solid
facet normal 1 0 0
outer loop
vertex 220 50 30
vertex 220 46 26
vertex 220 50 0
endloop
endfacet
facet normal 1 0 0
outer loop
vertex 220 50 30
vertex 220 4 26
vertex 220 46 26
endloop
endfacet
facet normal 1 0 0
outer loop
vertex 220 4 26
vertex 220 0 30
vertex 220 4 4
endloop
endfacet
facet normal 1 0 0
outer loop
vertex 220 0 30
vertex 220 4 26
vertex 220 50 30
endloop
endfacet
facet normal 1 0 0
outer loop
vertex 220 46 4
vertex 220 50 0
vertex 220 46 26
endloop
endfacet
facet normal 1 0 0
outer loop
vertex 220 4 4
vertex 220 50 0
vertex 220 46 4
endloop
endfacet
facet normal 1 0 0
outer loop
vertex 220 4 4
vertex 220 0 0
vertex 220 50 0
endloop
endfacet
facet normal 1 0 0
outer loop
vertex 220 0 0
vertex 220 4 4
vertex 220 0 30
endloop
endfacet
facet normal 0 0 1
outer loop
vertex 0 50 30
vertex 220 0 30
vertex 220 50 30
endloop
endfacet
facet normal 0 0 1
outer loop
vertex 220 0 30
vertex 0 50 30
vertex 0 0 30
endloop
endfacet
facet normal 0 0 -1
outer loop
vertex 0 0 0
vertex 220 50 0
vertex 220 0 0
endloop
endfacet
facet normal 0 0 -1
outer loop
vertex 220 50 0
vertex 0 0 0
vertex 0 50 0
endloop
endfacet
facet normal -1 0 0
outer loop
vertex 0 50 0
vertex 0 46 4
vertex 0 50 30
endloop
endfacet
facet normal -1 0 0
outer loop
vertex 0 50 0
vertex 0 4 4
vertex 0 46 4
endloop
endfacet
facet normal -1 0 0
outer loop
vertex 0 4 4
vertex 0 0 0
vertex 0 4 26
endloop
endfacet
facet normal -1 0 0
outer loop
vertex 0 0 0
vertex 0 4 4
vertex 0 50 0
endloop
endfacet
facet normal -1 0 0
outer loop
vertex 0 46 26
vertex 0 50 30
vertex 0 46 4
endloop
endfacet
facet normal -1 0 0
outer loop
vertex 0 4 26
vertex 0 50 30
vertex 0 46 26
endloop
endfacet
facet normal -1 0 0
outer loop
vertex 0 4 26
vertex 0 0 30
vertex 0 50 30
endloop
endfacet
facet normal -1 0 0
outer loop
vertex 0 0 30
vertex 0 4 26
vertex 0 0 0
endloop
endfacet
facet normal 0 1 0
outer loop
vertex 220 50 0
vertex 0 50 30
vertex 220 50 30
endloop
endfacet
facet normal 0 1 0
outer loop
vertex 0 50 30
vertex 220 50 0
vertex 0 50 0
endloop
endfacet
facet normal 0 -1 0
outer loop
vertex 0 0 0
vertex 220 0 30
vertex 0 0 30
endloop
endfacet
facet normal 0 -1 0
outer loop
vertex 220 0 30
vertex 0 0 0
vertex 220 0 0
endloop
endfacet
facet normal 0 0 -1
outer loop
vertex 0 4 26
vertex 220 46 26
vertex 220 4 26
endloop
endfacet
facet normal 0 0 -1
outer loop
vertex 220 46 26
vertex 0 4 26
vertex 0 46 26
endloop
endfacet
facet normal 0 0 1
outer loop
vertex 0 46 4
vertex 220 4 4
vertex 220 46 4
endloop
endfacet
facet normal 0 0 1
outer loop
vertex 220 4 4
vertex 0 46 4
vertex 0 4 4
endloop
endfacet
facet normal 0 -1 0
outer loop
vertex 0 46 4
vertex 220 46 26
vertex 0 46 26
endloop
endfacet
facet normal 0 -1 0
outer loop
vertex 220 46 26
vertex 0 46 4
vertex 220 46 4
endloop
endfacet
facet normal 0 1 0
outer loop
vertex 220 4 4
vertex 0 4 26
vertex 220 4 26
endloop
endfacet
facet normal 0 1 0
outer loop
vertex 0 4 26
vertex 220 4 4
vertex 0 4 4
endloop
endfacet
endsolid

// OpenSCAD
$fn = 32;

// ----------------------------------------------------------------------
// Box beam: 200-250 mm hollow beam
// ----------------------------------------------------------------------

// --- parameters (mm) ---
beam_l = 220;             // beam length, X
beam_w = 50;              // beam width, Y
beam_h = 30;              // beam height, Z
wall = 4;                 // wall thickness

difference() {
  cube([beam_l, beam_w, beam_h]);
  translate([-1, wall, wall])
    cube([beam_l + 2, beam_w - 2 * wall, beam_h - 2 * wall]);
}
